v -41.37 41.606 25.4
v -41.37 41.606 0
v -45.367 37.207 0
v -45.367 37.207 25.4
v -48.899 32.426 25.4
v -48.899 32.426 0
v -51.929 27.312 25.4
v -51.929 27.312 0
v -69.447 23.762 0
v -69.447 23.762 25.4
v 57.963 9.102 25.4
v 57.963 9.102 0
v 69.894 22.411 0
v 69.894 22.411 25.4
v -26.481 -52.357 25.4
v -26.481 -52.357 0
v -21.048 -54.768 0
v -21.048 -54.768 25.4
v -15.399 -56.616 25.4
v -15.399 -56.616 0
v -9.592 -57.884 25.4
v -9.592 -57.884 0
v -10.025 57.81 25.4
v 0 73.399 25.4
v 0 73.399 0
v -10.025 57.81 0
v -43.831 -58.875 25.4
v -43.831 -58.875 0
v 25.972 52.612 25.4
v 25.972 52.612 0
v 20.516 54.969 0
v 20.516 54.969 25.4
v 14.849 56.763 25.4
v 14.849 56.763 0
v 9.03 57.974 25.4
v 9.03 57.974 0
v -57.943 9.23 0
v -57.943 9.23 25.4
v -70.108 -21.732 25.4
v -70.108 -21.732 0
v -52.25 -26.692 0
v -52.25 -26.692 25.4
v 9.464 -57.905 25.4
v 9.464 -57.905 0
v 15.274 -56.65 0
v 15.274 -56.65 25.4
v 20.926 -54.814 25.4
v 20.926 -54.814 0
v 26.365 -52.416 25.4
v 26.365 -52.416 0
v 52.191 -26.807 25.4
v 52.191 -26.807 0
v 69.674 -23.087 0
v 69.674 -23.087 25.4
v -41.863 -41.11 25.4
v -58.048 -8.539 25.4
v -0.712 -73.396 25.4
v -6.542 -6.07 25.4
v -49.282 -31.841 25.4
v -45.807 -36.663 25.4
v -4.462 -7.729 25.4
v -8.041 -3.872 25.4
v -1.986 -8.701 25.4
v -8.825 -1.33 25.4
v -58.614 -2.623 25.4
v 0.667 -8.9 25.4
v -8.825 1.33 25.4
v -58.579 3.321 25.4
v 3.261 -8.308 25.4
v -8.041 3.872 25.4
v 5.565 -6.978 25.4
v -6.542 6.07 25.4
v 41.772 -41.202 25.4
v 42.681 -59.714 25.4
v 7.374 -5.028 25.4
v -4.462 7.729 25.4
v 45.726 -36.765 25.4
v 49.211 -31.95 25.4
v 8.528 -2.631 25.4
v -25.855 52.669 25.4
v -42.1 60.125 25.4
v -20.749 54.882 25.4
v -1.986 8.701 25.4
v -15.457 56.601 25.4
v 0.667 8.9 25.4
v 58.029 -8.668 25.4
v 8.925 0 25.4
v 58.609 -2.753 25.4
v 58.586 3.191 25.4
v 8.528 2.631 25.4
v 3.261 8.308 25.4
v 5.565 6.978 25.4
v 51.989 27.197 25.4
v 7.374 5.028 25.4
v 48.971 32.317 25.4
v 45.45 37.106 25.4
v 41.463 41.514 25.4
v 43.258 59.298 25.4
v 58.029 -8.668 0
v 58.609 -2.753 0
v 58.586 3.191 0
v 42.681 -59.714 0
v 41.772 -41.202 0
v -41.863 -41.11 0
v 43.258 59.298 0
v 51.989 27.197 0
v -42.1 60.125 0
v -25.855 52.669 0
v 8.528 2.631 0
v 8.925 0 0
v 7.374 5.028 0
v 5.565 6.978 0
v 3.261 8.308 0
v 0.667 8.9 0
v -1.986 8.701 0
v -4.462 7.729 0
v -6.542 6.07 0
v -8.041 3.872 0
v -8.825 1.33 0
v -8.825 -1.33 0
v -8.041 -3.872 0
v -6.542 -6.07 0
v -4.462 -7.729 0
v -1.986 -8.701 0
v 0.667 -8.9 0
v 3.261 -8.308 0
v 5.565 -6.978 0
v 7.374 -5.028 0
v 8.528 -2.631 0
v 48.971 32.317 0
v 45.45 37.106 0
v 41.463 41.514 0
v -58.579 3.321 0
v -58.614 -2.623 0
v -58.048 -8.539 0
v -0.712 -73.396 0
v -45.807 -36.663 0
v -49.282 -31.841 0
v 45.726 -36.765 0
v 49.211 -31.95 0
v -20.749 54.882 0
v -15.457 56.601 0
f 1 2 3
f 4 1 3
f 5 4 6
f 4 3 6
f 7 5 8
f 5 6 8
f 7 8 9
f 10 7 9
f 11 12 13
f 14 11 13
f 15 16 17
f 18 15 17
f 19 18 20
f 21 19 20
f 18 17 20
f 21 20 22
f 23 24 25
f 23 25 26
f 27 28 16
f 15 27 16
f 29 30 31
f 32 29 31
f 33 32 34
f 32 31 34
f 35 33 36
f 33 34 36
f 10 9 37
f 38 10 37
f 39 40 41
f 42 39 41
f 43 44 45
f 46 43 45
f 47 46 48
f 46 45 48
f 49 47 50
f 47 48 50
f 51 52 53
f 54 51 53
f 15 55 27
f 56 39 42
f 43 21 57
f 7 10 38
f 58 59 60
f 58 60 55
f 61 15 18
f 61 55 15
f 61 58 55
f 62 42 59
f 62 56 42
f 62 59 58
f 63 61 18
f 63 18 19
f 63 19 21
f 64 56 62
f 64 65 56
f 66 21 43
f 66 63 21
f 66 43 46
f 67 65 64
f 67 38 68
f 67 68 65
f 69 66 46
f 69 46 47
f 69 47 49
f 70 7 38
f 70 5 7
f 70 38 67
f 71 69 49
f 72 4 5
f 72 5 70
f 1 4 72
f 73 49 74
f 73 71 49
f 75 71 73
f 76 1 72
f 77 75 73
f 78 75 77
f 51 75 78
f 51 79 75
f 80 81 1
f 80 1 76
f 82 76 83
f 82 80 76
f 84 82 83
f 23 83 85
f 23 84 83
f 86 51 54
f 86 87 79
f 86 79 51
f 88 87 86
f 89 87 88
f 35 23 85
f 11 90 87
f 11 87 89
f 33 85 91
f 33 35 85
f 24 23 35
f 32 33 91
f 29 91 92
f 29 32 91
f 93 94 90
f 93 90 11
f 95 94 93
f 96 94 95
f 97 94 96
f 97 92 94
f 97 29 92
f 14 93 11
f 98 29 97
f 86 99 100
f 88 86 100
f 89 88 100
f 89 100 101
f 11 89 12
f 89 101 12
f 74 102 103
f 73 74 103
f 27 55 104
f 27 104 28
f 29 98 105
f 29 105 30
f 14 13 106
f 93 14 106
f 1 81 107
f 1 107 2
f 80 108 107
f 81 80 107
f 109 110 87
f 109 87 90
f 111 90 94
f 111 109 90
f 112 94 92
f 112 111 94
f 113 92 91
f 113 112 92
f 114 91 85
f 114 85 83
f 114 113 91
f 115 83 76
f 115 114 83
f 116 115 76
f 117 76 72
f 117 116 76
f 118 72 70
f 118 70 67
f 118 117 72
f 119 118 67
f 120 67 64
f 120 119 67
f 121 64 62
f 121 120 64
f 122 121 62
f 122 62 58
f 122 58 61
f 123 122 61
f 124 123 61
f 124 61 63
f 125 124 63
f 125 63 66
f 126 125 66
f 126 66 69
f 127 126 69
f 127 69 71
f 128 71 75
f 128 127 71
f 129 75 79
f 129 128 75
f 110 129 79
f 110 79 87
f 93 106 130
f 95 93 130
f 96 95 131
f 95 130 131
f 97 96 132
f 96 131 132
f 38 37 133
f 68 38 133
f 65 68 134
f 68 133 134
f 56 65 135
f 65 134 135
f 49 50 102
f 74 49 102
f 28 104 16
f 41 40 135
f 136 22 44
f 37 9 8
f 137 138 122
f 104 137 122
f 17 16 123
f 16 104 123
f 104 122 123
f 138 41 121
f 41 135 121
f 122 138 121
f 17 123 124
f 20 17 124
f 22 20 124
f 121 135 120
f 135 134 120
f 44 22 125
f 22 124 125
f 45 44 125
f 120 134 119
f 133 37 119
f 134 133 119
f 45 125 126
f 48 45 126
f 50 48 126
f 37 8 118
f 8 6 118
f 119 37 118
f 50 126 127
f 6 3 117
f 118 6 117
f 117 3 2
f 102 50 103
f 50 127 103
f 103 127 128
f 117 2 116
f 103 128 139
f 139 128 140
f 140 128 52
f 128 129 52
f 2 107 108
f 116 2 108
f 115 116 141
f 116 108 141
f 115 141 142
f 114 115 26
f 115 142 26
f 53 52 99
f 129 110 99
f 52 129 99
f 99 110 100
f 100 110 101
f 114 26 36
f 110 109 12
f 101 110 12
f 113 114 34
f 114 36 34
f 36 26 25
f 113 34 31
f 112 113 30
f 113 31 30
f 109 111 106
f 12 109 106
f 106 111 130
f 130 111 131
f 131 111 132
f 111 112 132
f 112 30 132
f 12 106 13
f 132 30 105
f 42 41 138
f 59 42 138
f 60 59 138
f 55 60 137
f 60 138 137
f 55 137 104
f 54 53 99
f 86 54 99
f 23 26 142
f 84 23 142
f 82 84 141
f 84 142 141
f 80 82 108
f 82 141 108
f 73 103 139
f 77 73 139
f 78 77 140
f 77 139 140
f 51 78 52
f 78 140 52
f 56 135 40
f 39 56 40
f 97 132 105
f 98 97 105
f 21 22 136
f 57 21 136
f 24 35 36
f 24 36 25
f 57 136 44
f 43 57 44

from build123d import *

# Parameters (mm, degrees)
F0_R     = 8.924881
F1_DEPTH = 25.4


with BuildPart() as f1:
    # F0 (on Top) → F1 (new body)
    with BuildSketch(Plane.XY):
        with BuildLine():
            Line((0, 73.399357), (-10.024788, 57.810382))
            ThreePointArc((-10.024788, 57.810382), (-18.123263, 55.803978), (-25.855271, 52.669172))
            Line((-25.855271, 52.669172), (-42.100142, 60.125234))
            Line((-42.100142, 60.125234), (-41.370499, 41.605511))
            ThreePointArc((-41.370499, 41.605511), (-47.193789, 34.860908), (-51.928579, 27.312257))
            Line((-51.928579, 27.312257), (-69.446667, 23.761863))
            Line((-69.446667, 23.761863), (-57.942551, 9.230248))
            ThreePointArc((-57.942551, 9.230248), (-58.672093, 0.349475), (-58.048394, -8.53936))
            Line((-58.048394, -8.53936), (-70.108395, -21.731974))
            Line((-70.108395, -21.731974), (-52.250248, -26.691726))
            ThreePointArc((-52.250248, -26.691726), (-47.605717, -34.296244), (-41.863184, -41.109737))
            Line((-41.863184, -41.109737), (-43.831057, -58.875327))
            Line((-43.831057, -58.875327), (-26.480851, -52.357437))
            ThreePointArc((-26.480851, -52.357437), (-18.246902, -55.763673), (-9.592097, -57.883748))
            Line((-9.592097, -57.883748), (-0.711689, -73.395907))
            Line((-0.711689, -73.395907), (9.46378, -57.904866))
            ThreePointArc((9.46378, -57.904866), (18.123263, -55.803978), (26.364742, -52.416))
            Line((26.364742, -52.416), (42.681144, -59.714199))
            Line((42.681144, -59.714199), (41.771966, -41.202421))
            ThreePointArc((41.771966, -41.202421), (47.529586, -34.401673), (52.190961, -26.807467))
            Line((52.190961, -26.807467), (69.6738, -23.087383))
            Line((69.6738, -23.087383), (58.029324, -8.667996))
            ThreePointArc((58.029324, -8.667996), (58.672724, 0.219434), (57.962866, 9.101802))
            Line((57.962866, 9.101802), (69.894383, 22.410732))
            Line((69.894383, 22.410732), (51.988986, 27.197096))
            ThreePointArc((51.988986, 27.197096), (47.270938, 34.756223), (41.462611, 41.513715))
            Line((41.462611, 41.513715), (43.258134, 59.297551))
            Line((43.258134, 59.297551), (25.971943, 52.611737))
            ThreePointArc((25.971943, 52.611737), (17.705353, 55.937976), (9.030398, 57.974034))
            Line((9.030398, 57.974034), (0, 73.399357))
        make_face()
        Circle(F0_R, mode=Mode.SUBTRACT)
    extrude(amount=F1_DEPTH)


solid = f1.part
